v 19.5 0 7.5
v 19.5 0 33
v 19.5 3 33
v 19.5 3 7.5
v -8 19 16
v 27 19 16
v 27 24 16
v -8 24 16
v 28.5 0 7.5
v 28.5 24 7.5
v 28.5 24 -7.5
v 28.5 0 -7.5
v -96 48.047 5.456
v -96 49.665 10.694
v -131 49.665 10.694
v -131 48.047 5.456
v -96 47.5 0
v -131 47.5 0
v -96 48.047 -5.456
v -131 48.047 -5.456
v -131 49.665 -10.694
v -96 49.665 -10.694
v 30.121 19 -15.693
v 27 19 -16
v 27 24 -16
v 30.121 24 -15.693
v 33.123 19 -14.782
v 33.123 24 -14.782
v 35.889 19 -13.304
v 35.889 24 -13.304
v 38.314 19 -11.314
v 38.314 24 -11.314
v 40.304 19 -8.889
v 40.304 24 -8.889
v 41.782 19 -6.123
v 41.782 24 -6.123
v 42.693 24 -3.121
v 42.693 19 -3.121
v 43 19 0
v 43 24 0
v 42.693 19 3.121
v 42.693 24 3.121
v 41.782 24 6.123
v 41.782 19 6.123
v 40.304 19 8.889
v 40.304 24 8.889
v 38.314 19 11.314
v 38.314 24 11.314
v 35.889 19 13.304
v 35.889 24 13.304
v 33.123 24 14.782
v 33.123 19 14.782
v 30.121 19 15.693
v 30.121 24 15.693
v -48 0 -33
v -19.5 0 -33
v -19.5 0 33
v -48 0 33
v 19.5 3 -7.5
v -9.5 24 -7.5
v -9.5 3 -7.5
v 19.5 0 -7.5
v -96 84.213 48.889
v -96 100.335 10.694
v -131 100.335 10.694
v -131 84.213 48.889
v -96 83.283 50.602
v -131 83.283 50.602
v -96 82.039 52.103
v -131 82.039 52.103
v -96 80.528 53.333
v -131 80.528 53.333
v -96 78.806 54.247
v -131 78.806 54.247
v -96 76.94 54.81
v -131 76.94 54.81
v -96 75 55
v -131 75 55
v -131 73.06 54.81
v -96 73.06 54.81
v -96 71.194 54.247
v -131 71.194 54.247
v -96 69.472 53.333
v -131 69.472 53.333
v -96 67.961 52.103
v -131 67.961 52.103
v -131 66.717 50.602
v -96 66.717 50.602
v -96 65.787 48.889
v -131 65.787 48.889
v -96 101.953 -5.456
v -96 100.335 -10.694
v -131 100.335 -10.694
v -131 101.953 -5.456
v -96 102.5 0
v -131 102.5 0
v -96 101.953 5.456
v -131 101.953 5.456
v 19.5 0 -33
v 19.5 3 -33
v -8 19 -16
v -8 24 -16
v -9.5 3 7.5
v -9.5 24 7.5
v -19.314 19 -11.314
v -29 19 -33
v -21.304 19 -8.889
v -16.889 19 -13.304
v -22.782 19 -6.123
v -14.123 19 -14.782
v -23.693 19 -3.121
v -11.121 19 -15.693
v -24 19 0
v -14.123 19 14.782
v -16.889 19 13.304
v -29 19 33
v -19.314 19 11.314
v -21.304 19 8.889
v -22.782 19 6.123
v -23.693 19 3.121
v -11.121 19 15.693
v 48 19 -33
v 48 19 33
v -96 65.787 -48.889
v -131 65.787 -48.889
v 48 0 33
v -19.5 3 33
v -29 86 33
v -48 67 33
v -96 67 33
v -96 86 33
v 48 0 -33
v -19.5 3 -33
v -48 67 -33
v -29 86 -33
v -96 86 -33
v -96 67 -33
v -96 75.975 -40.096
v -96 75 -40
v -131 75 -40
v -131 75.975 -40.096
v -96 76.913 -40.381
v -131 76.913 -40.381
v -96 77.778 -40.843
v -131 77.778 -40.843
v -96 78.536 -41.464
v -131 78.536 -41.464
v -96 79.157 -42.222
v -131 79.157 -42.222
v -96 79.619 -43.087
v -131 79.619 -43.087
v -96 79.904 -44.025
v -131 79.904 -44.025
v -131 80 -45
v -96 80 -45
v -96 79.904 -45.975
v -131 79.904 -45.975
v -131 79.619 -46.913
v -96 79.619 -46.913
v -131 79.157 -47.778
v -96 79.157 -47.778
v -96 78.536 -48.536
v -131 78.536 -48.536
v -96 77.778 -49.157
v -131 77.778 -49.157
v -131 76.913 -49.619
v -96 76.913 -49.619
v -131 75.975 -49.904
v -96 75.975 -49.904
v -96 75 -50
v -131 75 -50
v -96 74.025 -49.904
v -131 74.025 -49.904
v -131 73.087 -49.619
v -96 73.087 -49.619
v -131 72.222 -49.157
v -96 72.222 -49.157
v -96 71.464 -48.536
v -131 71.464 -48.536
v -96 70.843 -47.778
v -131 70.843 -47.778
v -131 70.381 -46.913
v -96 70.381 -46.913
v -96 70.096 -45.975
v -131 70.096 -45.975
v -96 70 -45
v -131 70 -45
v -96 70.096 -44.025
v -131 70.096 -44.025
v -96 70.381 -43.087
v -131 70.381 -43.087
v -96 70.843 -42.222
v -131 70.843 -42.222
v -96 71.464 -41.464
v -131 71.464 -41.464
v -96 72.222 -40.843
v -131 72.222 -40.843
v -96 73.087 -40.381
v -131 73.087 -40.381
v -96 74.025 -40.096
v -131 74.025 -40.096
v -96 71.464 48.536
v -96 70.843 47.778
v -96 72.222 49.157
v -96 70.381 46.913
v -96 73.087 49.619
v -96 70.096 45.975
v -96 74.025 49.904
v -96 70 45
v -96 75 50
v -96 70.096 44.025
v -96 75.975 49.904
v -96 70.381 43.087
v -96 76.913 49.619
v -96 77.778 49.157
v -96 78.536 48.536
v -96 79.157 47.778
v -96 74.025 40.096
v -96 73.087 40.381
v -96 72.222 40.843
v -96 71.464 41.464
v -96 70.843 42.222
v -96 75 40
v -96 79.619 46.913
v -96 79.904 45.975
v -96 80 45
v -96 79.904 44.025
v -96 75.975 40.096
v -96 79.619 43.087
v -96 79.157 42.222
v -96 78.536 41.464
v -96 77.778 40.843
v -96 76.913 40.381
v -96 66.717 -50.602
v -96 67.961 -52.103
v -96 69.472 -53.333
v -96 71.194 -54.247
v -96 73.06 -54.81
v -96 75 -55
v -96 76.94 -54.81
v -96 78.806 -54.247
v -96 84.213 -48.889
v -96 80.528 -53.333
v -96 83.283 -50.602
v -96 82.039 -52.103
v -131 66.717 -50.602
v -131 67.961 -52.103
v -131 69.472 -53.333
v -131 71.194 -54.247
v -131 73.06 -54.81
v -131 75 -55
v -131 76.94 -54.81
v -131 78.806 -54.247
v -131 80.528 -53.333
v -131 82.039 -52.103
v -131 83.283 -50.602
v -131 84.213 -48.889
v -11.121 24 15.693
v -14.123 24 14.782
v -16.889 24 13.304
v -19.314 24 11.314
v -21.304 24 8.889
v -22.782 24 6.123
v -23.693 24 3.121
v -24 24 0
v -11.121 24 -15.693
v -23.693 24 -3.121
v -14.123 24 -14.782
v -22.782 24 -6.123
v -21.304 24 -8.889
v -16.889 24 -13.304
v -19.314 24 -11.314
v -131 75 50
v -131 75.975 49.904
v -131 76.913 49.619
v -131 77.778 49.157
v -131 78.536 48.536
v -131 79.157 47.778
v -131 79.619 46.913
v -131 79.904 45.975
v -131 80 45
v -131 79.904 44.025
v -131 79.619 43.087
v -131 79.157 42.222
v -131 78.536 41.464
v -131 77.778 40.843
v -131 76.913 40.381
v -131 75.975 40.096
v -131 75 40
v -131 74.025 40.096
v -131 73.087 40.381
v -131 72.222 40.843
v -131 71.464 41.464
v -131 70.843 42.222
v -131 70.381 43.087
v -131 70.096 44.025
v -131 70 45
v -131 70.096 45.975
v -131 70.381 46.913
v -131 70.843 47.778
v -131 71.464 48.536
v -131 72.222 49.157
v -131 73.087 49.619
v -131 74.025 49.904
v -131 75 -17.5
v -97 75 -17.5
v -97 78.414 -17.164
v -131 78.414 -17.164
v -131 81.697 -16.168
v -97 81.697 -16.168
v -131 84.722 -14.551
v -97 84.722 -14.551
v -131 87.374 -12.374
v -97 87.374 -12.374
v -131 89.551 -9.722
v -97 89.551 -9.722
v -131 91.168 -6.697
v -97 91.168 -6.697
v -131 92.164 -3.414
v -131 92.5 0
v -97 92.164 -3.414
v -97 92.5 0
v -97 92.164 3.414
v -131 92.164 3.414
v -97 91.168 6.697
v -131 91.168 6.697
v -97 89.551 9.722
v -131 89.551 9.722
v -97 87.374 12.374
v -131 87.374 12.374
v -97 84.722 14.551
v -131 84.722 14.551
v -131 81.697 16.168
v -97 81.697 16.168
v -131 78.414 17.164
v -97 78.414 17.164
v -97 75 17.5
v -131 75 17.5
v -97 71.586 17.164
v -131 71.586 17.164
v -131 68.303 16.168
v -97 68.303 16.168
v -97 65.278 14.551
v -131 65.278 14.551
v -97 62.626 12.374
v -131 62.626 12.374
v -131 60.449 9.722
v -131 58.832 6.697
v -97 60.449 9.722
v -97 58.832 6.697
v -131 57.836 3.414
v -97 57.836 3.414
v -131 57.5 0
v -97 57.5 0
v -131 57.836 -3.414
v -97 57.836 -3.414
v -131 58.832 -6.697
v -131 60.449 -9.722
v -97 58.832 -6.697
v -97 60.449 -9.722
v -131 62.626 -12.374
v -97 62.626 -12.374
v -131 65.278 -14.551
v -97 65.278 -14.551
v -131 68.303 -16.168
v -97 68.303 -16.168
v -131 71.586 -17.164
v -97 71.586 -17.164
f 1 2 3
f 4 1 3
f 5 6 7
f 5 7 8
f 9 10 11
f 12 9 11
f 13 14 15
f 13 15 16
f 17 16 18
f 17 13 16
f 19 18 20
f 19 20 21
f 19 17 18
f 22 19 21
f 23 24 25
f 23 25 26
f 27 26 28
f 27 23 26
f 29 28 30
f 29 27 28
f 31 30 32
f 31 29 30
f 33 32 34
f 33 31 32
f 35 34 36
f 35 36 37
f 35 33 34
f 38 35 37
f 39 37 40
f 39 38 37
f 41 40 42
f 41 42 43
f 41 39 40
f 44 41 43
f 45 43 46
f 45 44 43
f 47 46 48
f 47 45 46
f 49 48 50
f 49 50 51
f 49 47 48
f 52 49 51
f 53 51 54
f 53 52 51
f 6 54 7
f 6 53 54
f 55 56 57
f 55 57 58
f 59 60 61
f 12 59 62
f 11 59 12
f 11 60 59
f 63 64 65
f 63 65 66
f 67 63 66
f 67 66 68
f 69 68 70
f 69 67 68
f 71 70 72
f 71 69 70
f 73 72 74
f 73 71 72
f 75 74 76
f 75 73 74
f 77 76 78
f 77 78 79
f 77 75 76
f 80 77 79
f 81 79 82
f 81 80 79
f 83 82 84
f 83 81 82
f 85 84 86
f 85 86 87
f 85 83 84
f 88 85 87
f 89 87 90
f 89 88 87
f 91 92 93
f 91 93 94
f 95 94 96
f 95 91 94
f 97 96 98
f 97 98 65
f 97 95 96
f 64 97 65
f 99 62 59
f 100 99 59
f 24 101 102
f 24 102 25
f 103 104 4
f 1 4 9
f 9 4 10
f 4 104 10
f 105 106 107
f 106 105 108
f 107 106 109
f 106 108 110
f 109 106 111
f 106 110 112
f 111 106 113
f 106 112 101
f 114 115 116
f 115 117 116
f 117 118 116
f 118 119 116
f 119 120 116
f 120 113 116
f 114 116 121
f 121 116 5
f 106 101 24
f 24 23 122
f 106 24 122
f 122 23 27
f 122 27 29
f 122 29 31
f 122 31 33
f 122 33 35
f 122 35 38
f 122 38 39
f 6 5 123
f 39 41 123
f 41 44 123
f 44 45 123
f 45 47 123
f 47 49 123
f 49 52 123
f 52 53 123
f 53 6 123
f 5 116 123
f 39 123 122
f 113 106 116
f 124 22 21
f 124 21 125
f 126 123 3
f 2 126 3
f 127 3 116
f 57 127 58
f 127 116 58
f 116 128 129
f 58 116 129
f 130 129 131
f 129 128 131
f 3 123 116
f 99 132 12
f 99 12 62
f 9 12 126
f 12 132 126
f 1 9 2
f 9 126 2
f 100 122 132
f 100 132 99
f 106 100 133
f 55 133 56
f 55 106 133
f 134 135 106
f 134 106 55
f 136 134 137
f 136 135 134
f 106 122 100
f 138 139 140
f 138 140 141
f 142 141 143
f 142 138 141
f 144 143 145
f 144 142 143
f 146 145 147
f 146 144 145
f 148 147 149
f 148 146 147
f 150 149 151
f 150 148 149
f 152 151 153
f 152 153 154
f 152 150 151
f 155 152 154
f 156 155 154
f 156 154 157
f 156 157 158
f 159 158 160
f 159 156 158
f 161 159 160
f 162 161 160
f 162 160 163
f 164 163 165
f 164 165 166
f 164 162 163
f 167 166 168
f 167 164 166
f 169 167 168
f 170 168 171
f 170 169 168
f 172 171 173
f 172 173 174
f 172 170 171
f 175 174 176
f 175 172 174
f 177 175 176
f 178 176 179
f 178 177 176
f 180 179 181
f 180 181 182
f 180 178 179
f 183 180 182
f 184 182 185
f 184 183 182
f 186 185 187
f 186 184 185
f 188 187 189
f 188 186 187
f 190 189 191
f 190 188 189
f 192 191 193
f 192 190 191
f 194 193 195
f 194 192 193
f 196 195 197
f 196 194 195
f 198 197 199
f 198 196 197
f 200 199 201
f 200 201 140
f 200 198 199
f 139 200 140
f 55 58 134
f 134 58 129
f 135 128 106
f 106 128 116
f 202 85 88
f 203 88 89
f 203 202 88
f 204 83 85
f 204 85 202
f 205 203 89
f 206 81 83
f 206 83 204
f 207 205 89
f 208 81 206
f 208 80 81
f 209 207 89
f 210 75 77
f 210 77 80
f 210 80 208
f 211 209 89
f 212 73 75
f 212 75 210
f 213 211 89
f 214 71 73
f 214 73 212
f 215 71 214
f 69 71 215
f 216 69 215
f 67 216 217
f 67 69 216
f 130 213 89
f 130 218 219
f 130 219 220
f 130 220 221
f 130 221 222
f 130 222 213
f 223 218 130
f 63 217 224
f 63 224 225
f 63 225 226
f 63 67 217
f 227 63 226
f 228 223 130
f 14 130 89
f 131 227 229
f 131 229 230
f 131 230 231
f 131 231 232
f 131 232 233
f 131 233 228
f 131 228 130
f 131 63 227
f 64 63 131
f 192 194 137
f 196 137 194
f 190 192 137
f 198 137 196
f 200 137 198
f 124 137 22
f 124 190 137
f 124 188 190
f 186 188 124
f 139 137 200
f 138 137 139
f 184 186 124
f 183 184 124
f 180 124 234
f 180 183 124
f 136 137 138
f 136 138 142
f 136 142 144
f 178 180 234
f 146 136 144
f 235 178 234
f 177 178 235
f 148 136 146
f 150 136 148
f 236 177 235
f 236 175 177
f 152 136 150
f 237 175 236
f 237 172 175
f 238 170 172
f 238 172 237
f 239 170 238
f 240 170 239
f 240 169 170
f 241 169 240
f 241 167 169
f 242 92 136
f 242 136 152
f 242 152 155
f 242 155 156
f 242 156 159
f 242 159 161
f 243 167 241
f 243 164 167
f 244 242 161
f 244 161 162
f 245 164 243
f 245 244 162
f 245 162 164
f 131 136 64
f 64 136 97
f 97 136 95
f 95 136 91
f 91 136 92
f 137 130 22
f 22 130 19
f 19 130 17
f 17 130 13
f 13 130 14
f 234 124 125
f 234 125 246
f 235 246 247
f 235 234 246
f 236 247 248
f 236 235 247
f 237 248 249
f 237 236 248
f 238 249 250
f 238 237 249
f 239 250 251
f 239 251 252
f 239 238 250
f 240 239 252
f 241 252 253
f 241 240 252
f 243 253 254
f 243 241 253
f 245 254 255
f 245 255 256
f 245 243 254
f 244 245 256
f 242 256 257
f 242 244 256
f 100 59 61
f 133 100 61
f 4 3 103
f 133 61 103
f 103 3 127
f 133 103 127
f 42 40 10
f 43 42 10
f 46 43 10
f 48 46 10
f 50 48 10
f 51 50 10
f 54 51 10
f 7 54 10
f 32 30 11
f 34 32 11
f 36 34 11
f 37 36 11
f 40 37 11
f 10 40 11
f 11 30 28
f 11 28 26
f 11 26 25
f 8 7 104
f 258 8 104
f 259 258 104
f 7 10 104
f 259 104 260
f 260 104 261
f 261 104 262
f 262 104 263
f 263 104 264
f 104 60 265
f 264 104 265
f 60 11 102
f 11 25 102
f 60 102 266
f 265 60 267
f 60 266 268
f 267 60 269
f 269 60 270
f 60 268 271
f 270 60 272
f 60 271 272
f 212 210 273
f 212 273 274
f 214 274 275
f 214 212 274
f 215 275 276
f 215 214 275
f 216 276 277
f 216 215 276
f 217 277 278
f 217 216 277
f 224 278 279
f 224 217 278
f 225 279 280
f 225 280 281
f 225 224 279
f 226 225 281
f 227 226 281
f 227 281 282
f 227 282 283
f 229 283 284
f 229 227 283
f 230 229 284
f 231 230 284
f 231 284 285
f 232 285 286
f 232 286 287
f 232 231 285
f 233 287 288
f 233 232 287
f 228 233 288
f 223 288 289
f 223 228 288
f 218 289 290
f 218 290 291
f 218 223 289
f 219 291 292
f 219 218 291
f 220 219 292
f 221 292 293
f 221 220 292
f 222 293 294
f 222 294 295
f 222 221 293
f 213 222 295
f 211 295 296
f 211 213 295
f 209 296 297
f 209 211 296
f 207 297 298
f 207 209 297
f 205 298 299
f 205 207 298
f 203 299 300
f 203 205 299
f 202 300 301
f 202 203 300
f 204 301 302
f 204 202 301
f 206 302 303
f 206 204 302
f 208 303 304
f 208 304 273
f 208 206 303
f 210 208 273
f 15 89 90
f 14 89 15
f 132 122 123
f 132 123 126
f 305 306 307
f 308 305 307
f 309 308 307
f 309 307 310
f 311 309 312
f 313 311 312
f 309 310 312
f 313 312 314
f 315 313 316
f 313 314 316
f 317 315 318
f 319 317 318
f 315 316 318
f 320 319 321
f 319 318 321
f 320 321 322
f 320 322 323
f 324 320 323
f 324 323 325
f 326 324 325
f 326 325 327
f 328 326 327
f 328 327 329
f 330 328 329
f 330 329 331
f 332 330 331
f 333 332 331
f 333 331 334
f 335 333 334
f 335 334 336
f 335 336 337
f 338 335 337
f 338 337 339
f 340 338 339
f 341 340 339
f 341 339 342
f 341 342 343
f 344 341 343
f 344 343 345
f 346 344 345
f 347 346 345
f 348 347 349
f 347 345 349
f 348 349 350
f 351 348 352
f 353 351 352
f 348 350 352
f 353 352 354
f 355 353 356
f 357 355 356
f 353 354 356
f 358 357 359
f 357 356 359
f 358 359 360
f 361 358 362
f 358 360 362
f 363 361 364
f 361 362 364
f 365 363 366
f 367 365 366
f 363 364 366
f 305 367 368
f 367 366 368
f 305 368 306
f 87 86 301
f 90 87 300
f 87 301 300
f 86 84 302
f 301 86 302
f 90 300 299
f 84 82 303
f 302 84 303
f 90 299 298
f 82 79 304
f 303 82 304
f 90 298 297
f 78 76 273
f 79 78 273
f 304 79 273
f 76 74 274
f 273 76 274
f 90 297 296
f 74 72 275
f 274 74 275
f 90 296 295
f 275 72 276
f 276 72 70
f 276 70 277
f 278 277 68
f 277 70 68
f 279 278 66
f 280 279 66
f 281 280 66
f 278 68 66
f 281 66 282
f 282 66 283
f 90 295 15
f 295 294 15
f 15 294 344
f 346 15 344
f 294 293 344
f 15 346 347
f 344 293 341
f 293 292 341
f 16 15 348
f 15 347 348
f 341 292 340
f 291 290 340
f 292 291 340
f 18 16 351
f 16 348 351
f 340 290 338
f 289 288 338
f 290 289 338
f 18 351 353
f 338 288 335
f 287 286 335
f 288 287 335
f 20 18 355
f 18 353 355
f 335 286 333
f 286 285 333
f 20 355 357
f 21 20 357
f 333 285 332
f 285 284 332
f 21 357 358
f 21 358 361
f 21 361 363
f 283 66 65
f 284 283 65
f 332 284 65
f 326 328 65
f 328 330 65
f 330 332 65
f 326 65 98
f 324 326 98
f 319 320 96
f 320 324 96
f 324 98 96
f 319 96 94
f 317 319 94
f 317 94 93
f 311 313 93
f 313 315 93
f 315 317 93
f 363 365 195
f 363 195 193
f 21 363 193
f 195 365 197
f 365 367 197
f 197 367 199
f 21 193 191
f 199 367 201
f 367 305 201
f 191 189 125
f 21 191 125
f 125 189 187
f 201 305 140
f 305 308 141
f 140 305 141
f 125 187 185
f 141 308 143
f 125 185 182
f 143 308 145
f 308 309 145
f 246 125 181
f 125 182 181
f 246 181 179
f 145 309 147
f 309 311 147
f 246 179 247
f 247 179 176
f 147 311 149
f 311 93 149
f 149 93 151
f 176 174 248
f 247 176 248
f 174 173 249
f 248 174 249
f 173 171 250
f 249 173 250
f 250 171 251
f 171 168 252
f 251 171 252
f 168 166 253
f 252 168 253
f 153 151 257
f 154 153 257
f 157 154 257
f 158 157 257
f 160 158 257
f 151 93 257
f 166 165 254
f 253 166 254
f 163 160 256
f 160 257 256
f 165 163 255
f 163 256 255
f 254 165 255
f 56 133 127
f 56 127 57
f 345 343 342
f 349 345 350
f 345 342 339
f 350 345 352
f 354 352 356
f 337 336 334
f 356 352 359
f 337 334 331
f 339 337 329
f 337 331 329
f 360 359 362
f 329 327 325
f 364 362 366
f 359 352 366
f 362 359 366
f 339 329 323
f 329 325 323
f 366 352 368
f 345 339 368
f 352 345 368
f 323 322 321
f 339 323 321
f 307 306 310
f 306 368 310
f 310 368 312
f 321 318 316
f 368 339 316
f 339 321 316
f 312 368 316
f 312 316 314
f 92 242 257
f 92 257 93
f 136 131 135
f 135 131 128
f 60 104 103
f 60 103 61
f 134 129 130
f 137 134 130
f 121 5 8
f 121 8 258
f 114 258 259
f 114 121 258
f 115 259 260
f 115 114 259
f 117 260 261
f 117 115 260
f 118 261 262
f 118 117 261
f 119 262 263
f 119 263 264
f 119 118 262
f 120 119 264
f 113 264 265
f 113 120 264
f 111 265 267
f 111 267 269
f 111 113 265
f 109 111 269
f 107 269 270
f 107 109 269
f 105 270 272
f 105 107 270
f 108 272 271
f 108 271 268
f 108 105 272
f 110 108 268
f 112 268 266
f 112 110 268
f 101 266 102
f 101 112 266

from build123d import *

# Parameters (mm, degrees)
BOSS_EXTRUDE1_DEPTH = 33
BOSS_EXTRUDE2_DEPTH = 5
SKETCH3_W           = 38
SKETCH3_H           = 15
CUT_EXTRUDE1_DEPTH  = 119.949569146
SKETCH4_R           = 5
BOSS_EXTRUDE3_DEPTH = 35
HOLE1_D             = 35
HOLE1_DEPTH         = 34


with BuildPart() as part:
    # Sketch1 → Boss-Extrude1 (new, symmetric)
    with BuildSketch(Plane.XY):
        Polygon((-96, 86), (-29, 86), (-29, 19), (48, 19), (48, 0), (19.5, 0), (19.5, 3), (-19.5, 3), (-19.5, 0), (-48, 0), (-48, 67), (-96, 67), align=None)
    extrude(amount=BOSS_EXTRUDE1_DEPTH, both=True)

    # Sketch2 → Boss-Extrude2 (add)
    with BuildSketch(Plane(origin=(0, 19, 0), x_dir=(1, 0, 0), z_dir=(0, 1, 0))):
        with BuildLine():
            Line((-8, 16), (27, 16))
            ThreePointArc((27, 16), (43, 0), (27, -16))
            Line((27, -16), (-8, -16))
            ThreePointArc((-8, -16), (-24, 0), (-8, 16))
        make_face()
    extrude(amount=BOSS_EXTRUDE2_DEPTH)

    # Sketch3 → Cut-Extrude1 (cut, through all)
    with BuildSketch(Plane(origin=(0, 24, 0), x_dir=(1, 0, 0), z_dir=(0, 1, 0))):
        with Locations((9.5, 0)):
            Rectangle(SKETCH3_W, SKETCH3_H)
    extrude(amount=-CUT_EXTRUDE1_DEPTH, mode=Mode.SUBTRACT)

    # Sketch4 → Boss-Extrude3 (add)
    with BuildSketch(Plane.ZY.offset(96)):
        with BuildLine():
            Line((-48.888888889, 84.21284664), (-10.694444444, 100.33532826))
            ThreePointArc((-10.694444444, 100.33532826), (0, 102.5), (10.694444444, 100.33532826))
            Line((10.694444444, 100.33532826), (48.888888889, 84.21284664))
            ThreePointArc((48.888888889, 84.21284664), (55, 75), (48.888888889, 65.78715336))
            Line((48.888888889, 65.78715336), (10.694444444, 49.66467174))
            ThreePointArc((10.694444444, 49.66467174), (0, 47.5), (-10.694444444, 49.66467174))
            Line((-10.694444444, 49.66467174), (-48.888888889, 65.78715336))
            ThreePointArc((-48.888888889, 65.78715336), (-55, 75), (-48.888888889, 84.21284664))
        make_face()
        with Locations((-45, 75)):
            Circle(SKETCH4_R, mode=Mode.SUBTRACT)
        with Locations((45, 75)):
            Circle(SKETCH4_R, mode=Mode.SUBTRACT)
    extrude(amount=BOSS_EXTRUDE3_DEPTH)

    # Hole1
    with Locations(Plane.ZY.offset(131)):
        with Locations((0, 75)):
            Hole(HOLE1_D / 2, depth=HOLE1_DEPTH)


solid = part.part
